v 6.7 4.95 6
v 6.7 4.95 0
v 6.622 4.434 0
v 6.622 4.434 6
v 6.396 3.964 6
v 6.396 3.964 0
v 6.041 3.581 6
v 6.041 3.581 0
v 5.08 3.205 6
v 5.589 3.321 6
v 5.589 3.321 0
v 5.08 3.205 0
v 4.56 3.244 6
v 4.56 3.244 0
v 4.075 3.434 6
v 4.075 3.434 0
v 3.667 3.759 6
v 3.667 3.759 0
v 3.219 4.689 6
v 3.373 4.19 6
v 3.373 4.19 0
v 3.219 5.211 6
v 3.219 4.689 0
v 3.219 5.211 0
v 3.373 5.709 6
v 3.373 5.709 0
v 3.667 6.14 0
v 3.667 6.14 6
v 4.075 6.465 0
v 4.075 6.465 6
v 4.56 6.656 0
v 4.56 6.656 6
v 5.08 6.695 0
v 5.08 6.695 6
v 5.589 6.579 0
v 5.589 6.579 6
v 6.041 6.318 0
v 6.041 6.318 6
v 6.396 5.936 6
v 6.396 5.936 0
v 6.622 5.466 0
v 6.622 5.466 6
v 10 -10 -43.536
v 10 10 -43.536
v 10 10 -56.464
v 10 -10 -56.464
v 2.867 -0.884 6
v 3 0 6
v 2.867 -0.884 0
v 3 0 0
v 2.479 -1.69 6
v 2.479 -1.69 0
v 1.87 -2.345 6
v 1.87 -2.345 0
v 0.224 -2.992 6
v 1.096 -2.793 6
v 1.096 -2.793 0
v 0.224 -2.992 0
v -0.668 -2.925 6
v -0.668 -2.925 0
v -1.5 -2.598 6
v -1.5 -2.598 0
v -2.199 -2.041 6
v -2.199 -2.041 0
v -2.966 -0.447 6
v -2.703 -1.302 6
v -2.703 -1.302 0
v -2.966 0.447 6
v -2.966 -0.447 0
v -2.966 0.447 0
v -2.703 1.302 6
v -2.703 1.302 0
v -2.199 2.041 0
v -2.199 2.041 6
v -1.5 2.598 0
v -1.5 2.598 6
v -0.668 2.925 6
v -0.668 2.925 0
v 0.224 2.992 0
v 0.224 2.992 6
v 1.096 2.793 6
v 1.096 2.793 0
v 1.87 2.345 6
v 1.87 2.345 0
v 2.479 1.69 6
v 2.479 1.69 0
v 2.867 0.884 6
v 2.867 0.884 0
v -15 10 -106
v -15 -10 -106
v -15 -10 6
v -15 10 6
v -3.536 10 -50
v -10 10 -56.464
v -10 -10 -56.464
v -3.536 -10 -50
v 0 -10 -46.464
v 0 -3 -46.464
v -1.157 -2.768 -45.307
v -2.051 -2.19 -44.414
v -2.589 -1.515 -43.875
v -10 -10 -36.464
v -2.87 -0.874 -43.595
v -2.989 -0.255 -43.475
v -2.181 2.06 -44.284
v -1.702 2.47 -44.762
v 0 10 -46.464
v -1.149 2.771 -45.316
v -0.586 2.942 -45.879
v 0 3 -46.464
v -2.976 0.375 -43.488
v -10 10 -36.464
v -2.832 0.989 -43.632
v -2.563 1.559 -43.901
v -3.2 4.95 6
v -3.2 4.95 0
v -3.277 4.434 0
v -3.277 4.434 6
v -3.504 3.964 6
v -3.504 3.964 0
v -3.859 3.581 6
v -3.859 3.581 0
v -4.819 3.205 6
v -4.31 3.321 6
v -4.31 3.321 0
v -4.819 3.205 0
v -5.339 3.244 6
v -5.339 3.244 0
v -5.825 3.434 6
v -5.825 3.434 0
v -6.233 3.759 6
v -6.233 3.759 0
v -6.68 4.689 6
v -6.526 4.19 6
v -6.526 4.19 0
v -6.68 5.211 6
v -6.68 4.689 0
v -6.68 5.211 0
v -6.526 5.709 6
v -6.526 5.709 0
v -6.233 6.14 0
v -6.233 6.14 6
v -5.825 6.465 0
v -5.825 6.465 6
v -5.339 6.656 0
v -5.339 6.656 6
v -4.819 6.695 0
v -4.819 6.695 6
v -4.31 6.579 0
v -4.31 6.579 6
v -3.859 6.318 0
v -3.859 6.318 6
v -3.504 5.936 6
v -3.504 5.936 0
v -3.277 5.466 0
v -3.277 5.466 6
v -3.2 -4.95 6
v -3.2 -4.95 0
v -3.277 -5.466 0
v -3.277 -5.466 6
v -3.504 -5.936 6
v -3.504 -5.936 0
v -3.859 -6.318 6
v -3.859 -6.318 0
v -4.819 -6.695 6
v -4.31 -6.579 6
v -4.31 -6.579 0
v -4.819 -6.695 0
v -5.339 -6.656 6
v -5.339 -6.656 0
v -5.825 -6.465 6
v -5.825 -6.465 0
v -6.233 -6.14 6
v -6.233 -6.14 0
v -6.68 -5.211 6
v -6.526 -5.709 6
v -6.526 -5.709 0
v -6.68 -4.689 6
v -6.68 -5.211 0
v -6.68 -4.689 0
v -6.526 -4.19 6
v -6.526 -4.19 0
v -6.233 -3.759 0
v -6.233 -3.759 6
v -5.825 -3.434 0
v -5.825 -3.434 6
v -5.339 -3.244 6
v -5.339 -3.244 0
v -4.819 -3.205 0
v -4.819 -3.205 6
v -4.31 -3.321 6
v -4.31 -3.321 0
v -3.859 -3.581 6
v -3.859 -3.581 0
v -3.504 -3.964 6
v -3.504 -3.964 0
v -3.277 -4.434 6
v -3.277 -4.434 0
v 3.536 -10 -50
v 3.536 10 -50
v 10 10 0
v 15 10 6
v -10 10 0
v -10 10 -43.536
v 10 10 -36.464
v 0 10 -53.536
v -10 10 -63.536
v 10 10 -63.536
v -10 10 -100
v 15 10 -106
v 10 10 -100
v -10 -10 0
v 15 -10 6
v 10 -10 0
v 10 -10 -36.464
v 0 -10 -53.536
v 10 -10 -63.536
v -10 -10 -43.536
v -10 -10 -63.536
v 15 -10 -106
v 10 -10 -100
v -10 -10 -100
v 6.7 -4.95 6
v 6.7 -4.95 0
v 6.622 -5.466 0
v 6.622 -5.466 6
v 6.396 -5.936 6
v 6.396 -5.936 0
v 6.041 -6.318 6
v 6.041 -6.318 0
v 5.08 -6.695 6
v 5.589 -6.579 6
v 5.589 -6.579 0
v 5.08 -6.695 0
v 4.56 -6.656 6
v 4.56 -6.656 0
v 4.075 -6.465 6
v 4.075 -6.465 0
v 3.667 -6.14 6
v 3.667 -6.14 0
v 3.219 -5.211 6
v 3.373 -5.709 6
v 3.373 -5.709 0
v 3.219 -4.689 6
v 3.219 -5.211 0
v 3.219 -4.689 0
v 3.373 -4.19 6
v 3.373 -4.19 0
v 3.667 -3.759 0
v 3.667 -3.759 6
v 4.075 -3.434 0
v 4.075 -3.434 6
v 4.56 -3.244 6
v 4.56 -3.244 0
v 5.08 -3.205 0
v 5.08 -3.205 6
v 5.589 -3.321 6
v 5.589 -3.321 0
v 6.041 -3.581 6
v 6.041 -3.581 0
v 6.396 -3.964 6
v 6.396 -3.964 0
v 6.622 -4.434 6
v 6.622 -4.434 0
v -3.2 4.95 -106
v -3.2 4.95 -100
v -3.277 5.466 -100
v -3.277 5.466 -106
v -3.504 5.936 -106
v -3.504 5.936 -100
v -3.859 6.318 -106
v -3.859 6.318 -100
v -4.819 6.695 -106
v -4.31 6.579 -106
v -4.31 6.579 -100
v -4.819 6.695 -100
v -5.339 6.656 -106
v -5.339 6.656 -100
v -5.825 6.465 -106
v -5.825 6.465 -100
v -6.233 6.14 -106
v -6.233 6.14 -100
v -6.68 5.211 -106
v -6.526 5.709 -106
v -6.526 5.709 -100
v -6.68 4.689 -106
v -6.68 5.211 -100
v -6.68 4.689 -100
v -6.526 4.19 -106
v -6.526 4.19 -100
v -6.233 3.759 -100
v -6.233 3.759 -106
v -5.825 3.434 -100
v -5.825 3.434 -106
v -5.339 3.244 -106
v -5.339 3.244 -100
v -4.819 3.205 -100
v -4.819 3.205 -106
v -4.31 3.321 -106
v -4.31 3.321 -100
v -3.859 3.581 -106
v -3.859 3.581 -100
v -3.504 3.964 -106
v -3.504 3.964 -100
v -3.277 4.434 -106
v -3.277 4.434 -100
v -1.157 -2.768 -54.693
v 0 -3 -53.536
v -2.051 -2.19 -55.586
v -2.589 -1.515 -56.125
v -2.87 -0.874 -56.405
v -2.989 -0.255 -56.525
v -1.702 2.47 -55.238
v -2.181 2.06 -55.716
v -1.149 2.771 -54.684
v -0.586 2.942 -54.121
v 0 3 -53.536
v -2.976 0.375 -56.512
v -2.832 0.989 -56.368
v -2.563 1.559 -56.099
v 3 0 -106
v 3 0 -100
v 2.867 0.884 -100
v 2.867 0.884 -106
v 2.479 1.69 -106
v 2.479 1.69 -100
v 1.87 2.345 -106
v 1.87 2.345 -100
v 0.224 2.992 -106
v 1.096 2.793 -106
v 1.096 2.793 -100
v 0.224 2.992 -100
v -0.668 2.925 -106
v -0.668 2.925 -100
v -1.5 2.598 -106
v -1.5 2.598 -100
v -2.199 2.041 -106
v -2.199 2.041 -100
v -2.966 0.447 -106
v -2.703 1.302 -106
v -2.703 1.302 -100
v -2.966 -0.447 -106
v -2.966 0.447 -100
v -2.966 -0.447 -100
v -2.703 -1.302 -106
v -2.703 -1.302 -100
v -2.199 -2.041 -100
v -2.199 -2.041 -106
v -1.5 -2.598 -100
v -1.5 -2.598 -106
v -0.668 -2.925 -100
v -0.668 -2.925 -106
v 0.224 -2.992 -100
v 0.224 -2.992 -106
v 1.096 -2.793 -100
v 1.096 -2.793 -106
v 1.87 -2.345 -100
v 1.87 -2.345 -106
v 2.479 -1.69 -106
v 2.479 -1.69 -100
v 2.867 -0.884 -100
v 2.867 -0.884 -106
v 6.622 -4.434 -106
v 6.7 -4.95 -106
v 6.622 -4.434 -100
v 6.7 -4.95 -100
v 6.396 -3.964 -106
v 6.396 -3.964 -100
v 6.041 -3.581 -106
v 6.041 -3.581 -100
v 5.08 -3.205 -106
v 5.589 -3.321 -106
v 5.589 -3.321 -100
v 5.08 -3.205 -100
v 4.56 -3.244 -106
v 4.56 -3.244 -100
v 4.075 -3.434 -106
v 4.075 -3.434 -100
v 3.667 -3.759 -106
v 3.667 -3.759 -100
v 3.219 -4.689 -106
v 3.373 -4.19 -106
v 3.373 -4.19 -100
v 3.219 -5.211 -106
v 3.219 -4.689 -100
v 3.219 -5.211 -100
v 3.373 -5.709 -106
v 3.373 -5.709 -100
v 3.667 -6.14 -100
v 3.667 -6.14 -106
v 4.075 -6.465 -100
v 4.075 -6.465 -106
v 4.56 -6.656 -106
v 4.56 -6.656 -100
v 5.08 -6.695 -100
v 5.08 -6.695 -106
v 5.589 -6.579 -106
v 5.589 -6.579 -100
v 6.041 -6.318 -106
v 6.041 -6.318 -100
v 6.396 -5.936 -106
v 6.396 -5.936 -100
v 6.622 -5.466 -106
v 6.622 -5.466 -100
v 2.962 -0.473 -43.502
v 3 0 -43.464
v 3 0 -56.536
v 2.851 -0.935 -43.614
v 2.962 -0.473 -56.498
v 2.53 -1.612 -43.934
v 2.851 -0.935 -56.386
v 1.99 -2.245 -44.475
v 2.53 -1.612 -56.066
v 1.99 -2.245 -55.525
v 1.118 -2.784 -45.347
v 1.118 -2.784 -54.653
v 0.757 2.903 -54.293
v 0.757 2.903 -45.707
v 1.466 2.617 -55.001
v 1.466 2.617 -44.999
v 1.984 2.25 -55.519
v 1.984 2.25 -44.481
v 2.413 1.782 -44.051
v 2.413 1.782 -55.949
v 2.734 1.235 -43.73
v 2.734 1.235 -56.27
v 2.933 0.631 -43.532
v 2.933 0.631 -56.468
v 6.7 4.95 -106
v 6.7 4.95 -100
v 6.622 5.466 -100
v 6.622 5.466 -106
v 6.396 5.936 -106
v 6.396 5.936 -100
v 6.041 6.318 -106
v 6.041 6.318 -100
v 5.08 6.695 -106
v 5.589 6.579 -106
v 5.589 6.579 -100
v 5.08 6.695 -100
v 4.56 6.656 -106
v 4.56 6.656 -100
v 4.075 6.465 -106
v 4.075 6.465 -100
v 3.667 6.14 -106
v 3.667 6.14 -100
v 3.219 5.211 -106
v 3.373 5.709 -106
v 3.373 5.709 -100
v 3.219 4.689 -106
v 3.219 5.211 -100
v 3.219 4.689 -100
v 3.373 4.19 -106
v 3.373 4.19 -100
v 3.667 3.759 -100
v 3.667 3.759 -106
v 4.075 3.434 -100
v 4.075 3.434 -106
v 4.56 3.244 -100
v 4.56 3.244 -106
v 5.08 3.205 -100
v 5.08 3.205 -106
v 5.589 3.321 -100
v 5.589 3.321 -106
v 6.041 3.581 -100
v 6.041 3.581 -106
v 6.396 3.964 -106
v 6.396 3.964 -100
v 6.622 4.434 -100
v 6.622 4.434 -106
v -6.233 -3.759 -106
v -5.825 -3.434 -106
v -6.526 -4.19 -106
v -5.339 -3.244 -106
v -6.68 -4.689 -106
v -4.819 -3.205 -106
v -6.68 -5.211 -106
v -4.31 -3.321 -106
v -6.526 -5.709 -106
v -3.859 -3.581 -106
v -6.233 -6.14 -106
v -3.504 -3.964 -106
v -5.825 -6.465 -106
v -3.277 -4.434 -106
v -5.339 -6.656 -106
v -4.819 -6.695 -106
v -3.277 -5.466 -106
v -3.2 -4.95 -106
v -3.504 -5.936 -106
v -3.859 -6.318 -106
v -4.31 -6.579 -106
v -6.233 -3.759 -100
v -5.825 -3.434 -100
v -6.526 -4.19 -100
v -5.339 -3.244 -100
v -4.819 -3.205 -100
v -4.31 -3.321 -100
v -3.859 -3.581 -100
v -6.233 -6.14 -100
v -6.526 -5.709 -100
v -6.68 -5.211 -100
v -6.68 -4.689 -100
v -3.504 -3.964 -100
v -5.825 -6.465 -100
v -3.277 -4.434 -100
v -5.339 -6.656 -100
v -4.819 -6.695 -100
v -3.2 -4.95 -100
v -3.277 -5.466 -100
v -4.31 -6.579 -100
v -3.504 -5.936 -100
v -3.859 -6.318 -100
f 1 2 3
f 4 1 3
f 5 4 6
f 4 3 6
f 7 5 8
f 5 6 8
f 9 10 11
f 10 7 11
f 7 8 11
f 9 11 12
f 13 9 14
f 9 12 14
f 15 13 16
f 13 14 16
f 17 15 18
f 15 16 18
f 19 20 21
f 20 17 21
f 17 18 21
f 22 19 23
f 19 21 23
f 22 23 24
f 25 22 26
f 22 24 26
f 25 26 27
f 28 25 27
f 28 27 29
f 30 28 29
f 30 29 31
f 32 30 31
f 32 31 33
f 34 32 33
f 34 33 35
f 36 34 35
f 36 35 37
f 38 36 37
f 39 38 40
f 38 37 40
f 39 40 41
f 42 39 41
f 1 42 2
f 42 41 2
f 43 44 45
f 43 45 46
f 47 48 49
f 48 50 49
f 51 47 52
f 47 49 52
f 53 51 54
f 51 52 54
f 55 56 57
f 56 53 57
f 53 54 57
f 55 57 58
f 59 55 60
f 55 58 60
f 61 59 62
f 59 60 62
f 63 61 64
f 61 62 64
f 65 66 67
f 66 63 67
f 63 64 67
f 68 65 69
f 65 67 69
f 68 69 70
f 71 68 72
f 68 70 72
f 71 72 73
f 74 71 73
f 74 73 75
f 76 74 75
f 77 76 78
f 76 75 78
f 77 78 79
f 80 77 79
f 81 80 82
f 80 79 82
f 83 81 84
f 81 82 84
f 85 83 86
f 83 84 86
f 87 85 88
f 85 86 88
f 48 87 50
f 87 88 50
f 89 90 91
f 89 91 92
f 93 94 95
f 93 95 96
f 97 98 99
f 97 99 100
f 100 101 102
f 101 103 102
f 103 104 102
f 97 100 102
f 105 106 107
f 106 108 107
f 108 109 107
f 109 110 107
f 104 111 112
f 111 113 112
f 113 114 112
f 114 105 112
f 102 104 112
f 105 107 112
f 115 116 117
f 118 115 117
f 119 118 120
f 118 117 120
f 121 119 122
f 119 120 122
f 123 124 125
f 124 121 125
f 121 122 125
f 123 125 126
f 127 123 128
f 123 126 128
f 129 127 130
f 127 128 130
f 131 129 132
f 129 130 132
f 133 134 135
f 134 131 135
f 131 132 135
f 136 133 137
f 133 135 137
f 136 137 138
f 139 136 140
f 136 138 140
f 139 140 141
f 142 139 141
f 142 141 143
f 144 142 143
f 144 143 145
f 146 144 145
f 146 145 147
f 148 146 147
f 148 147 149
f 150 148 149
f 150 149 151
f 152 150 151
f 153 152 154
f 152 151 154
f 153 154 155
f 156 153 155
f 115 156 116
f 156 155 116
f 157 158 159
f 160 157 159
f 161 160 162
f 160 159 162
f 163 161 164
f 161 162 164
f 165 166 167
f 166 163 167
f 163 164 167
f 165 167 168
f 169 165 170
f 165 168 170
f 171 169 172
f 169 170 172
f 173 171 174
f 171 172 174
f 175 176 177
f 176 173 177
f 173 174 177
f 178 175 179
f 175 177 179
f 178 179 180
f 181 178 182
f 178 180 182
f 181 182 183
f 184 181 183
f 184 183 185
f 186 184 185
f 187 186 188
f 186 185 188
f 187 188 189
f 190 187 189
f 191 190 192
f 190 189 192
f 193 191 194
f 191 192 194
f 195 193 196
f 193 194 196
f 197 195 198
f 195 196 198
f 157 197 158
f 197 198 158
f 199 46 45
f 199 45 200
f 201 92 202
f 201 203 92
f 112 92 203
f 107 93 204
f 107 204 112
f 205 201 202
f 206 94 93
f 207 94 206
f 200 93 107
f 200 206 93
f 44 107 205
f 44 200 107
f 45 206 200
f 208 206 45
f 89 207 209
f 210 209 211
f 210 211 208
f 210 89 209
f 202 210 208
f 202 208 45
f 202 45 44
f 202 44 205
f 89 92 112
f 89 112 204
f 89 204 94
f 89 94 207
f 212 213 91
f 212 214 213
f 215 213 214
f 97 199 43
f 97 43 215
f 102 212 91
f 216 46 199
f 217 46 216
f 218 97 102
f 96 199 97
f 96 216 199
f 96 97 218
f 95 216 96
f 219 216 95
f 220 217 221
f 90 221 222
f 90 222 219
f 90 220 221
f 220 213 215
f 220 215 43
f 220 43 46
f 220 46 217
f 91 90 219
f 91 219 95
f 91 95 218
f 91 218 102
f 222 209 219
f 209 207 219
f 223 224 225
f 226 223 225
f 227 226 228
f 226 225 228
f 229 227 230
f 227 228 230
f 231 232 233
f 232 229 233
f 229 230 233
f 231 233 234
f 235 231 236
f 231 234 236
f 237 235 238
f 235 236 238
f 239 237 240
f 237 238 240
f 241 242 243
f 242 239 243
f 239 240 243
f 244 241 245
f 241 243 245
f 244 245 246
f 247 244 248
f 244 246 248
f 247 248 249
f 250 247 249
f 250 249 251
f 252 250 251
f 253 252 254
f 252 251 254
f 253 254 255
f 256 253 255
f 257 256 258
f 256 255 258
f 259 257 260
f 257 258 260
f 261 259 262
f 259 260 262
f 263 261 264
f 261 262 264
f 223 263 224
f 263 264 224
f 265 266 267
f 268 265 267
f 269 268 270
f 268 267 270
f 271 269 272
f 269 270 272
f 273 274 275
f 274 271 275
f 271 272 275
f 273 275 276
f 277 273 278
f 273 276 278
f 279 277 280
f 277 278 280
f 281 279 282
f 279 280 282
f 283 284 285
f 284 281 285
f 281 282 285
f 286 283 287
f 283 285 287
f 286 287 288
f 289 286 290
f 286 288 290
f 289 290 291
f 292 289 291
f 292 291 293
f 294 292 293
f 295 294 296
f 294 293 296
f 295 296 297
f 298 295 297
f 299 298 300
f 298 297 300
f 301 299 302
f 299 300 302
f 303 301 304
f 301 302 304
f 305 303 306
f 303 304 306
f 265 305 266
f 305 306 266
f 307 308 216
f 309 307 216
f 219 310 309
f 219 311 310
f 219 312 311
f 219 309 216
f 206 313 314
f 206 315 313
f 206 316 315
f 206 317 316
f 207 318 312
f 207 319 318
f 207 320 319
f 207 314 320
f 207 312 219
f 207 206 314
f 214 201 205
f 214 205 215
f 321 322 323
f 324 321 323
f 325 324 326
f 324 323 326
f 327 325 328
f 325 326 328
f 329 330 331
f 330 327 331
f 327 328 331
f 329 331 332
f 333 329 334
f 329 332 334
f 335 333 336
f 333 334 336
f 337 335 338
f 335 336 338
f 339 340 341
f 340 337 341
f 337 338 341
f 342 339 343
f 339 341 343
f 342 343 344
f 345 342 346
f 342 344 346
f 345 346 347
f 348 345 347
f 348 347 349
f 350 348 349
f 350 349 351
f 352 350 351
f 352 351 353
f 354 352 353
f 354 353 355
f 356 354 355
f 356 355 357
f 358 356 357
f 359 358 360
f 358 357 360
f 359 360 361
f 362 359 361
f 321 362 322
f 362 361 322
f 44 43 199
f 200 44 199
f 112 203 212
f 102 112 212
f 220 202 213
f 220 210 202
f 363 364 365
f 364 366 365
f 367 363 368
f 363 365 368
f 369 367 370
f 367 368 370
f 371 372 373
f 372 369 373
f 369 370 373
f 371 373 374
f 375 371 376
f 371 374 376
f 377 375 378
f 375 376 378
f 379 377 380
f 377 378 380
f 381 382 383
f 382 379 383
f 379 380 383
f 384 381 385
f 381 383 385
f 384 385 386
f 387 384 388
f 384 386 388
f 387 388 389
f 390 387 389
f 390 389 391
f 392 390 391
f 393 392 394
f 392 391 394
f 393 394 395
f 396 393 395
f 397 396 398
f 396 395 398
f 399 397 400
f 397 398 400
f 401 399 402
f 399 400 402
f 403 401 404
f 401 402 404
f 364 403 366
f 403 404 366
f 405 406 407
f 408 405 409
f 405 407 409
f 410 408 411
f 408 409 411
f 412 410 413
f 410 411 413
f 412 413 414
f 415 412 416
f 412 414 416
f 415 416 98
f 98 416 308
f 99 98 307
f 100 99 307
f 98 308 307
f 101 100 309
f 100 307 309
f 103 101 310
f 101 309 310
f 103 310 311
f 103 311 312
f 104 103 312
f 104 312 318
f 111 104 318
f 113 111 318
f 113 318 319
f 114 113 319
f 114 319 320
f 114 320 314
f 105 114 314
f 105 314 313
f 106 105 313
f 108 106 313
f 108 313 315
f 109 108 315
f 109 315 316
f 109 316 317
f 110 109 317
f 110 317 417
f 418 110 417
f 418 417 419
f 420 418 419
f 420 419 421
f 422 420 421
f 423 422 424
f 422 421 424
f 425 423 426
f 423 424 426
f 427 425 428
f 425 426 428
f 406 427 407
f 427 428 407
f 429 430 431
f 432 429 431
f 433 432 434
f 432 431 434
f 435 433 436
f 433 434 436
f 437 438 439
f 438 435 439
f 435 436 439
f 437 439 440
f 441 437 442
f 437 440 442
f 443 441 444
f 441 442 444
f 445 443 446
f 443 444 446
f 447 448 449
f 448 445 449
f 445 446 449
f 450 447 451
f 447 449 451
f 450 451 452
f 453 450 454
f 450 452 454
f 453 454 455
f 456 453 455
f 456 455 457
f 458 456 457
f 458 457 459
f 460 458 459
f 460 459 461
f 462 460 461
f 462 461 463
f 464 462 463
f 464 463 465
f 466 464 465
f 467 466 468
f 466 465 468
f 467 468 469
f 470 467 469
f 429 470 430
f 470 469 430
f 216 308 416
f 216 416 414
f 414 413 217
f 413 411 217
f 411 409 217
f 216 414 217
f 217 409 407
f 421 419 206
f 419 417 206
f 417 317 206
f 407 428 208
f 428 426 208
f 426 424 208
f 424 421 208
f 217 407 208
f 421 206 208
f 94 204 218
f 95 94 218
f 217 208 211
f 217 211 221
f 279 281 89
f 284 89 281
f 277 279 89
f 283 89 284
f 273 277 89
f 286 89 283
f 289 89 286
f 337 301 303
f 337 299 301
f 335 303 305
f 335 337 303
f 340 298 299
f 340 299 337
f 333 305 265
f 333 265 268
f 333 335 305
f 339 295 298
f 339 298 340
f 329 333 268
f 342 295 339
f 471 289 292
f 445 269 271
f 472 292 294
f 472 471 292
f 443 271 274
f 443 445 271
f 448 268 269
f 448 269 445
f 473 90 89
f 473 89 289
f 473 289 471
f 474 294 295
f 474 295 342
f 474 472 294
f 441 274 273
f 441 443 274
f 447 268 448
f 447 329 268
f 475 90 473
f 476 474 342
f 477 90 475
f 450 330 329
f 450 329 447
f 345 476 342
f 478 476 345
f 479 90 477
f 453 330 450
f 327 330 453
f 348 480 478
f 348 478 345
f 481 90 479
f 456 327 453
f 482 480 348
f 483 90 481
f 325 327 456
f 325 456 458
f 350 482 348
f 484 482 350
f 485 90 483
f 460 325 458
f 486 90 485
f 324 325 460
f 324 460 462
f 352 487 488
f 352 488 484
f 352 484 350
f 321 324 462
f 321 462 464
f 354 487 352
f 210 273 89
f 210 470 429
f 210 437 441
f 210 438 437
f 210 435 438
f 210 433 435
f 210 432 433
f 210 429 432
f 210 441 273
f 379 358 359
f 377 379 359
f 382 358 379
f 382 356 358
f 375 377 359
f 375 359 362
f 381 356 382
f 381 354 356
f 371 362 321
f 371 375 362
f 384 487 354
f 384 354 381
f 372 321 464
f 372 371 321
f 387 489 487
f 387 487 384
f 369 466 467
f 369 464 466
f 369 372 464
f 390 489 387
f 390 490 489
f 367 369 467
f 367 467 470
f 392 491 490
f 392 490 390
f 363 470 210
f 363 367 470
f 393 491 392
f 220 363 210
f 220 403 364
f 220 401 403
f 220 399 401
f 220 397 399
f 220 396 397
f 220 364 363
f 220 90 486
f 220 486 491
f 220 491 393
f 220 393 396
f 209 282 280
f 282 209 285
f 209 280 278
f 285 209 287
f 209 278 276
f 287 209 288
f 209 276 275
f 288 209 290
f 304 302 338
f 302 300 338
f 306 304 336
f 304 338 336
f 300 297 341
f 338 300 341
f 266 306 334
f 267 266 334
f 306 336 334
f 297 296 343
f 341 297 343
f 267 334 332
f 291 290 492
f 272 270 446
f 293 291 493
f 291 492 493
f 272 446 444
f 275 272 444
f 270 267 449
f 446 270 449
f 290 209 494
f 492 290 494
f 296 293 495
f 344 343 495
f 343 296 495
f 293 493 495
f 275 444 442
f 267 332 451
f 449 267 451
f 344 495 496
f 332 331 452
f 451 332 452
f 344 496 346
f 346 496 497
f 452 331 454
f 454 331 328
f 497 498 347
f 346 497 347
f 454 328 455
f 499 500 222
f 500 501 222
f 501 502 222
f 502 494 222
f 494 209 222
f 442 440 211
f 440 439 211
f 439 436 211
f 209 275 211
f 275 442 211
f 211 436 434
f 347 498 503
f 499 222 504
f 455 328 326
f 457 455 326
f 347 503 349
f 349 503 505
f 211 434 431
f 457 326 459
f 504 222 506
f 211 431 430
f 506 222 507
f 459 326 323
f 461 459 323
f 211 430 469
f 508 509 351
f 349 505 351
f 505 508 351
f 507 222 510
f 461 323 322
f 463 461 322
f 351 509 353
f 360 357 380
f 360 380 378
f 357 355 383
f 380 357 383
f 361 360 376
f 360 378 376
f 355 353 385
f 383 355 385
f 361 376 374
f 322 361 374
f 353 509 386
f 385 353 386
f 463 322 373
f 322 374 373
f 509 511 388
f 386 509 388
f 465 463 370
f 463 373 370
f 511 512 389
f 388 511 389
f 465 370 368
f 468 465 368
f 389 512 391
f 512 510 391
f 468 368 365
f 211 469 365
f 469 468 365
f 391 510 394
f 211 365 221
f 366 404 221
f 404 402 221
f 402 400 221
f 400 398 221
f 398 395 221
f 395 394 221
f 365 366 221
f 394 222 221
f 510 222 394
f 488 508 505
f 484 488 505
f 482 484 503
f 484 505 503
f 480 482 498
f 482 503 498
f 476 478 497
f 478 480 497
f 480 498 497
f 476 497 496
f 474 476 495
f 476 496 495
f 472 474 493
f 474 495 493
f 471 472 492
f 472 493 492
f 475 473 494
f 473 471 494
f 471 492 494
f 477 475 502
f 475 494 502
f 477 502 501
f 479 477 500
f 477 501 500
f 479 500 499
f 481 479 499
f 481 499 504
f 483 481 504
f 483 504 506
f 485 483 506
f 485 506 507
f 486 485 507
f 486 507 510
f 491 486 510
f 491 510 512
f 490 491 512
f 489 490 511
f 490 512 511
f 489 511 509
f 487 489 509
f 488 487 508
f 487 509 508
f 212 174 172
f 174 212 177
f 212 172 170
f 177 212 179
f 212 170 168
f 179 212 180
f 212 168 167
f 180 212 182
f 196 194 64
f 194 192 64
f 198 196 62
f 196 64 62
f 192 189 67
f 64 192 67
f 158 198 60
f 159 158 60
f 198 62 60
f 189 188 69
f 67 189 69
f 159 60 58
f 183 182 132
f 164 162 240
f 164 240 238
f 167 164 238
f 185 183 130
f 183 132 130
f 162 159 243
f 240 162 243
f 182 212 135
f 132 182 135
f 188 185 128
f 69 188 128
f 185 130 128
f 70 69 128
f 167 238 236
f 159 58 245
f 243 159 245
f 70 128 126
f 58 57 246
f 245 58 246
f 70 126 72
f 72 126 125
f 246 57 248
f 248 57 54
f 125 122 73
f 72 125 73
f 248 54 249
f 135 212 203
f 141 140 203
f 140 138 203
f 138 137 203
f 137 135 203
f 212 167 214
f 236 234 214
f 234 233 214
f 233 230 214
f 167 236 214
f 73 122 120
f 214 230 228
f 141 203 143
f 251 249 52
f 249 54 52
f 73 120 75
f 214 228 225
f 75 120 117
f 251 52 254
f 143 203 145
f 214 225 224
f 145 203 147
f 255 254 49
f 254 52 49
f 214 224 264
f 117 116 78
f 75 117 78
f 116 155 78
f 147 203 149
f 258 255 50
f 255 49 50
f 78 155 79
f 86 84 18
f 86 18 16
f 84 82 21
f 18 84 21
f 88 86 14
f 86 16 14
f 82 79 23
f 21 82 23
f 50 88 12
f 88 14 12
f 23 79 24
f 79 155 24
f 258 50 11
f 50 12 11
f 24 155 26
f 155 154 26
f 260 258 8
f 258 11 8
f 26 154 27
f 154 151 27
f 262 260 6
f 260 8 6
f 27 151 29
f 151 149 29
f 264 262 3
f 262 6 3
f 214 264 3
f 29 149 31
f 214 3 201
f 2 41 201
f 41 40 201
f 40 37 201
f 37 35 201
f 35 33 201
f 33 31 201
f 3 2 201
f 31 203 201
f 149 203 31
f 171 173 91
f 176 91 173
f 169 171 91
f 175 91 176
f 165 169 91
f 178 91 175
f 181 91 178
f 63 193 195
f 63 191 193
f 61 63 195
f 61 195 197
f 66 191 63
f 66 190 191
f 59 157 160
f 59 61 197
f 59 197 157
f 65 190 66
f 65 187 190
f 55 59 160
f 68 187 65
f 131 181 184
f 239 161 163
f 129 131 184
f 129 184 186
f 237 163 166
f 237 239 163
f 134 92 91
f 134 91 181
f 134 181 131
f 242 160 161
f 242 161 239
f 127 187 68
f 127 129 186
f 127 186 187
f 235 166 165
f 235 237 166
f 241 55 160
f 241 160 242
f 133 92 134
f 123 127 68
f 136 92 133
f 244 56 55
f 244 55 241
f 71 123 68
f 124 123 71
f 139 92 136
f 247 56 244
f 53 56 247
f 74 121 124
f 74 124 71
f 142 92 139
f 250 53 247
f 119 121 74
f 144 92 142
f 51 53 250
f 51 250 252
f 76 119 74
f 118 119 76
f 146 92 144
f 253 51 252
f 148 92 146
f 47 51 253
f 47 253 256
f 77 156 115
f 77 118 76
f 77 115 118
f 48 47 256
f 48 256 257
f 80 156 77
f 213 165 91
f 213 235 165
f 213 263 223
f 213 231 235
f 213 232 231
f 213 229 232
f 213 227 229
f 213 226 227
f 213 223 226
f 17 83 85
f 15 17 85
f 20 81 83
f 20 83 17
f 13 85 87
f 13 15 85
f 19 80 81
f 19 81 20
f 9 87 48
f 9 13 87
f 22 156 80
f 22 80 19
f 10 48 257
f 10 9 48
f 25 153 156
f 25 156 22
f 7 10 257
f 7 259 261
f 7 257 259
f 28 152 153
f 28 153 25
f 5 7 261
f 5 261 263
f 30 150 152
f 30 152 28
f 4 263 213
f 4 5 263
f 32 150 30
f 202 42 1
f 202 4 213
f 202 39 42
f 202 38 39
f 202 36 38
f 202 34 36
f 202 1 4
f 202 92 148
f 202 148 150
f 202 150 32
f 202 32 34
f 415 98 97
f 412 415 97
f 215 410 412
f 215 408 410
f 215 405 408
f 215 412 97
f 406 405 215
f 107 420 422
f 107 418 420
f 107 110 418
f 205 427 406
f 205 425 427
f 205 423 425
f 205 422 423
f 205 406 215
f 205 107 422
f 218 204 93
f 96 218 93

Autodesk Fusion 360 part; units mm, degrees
sketch "草图1" plane through (0, 0, 0) normal (0, 0, 1) x (1, 0, 0)
  line L0 (15, -10) -> (-15, -10)
  line L1 (-15, -10) -> (-15, 10)
  line L2 (-15, 10) -> (15, 10)
  line L3 (15, 10) -> (15, -10)
  line L4 (15, -10) -> (-15, 10) construction
  line L5 (-15, -10) -> (15, 10) construction
  line L6 (0, 0) -> (19, 0) construction
  line L7 (0, 0) -> (9.0277, 9.0277) construction
  circle A0 centre (0, 0) radius 7 construction
  circle A1 centre (4.9497, 4.9497) radius 1.75
  circle A2 centre (-4.9497, 4.9497) radius 1.75
  circle A3 centre (-4.9497, -4.9497) radius 1.75
  circle A4 centre (4.9497, -4.9497) radius 1.75
  circle A5 centre (0, 0) radius 3
  dimension "d1" = 20
  dimension "d2" = 30
  dimension "d3" = 45
  dimension "d4" = 14
  dimension "d5" = 3.5
  dimension "d7" = 360
  dimension "d8" = 6
extrude "拉伸1" add sketch "草图1" along normal blind 6 makes body 1
sketch "草图2" plane through (0, 0, 0) normal (0, 0, -1) x (1, 0, 0)
  circle A0 centre (0, 0) radius 3
  circle A1 centre (4.9497, -4.9497) radius 1.75
  circle A2 centre (-4.9497, 4.9497) radius 1.75
  circle A3 centre (4.9497, 4.9497) radius 1.75
  circle A4 centre (-4.9497, -4.9497) radius 1.75
  line L0 (-15, -10) -> (15, -10)
  line L1 (15, -10) -> (15, 10)
  line L2 (15, 10) -> (-15, 10)
  line L3 (-15, 10) -> (-15, -10)
  line L4 (15, -10) -> (10, -10)
  line L5 (10, -10) -> (10, 10)
  line L6 (10, 10) -> (15, 10)
  line L7 (15, 10) -> (15, -10)
  line L8 (-15, -10) -> (-10, -10)
  line L9 (-10, -10) -> (-10, 10)
  line L10 (-10, 10) -> (-15, 10)
  line L11 (-15, 10) -> (-15, -10)
  dimension "d11" = 5
  dimension "d12" = 5
extrude "拉伸2" add sketch "草图2" along normal blind 100 contours L0 L2 L3 L8 L9 L10 L11 | L0 L1 L2 L4 L5 L6 L7 bodies 1
sketch "草图3" plane through (0, 0, -100) normal (0, 0, -1) x (1, 0, 0)
  line L0 (-15, 10) -> (-15, -10)
  line L1 (-15, -10) -> (-10, -10)
  line L2 (-10, -10) -> (-10, 10)
  line L3 (-10, 10) -> (-15, 10)
  line L4 (-10, 10) -> (-10, -10)
  line L5 (-10, -10) -> (10, -10)
  line L6 (10, -10) -> (10, 10)
  line L7 (10, 10) -> (-10, 10)
  circle A0 centre (-4.9497, -4.9497) radius 1.75
  circle A1 centre (4.9497, 4.9497) radius 1.75
  circle A2 centre (-4.9497, 4.9497) radius 1.75
  circle A3 centre (4.9497, -4.9497) radius 1.75
  circle A4 centre (0, 0) radius 3
  line L8 (15, 10) -> (10, 10)
  line L9 (10, 10) -> (10, -10)
  line L10 (10, -10) -> (15, -10)
  line L11 (15, -10) -> (15, 10)
extrude "拉伸3" add sketch "草图3" along normal blind 6 bodies 1
sketch "草图4" plane through (0, 10, 0) normal (0, 1, 0) x (-1, 0, 0)
  line L0 (15, -106) -> (15, 6)
  line L1 (15, 6) -> (-15, 6)
  line L2 (-15, 6) -> (-15, -106)
  line L3 (-15, -106) -> (15, -106)
  line L4 (10, -100) -> (-10, -100)
  line L5 (-10, -100) -> (-10, 0)
  line L6 (-10, 0) -> (10, 0)
  line L7 (10, 0) -> (10, -100)
  line L8 (47.9011, -50) -> (-70, -50)
  line L9 (0, -112.7701) -> (0, 40) construction
  line L10 (-10, -63.5355) -> (-13.5355, -60)
  line L11 (-13.5355, -60) -> (10, -36.4645)
  line L12 (10, -36.4645) -> (13.5355, -40)
  line L13 (13.5355, -40) -> (-10, -63.5355)
  line L14 (-10, -63.5355) -> (10, -36.4645)
  line L15 (13.5355, -40) -> (-13.5355, -60)
  line L16 (-10, -36.4645) -> (-13.5355, -40)
  line L17 (13.5355, -60) -> (-10, -36.4645)
  line L18 (-13.5355, -40) -> (10, -63.5355)
  line L19 (10, -63.5355) -> (13.5355, -60)
  line L20 (-10, -36.4645) -> (10, -63.5355)
  line L21 (13.5355, -60) -> (-13.5355, -40)
  point P0 (0, -50)
  dimension "d17" = 45
  dimension "d18" = 5
extrude "拉伸4" add sketch "草图4" against normal blind 20 contours L7 L13 L15 L17 | L7 L13 L17 L21 | L8 L13 L21 | L8 L15 L17 | L7 L14 L15 L17 | L7 L13 L20 L21 | L8 L15 L18 | L13 L14 L18 L20 | L11 L14 L17 L20 | L14 L15 L17 | L14 L15 L18 | L11 L20 L21 | L13 L20 L21 | L8 L11 L21 | L5 L11 L15 L18 | L5 L11 L18 L21 | L11 L14 L17 | L13 L18 L20 | L13 L14 L18 | L5 L14 L15 L18 | L11 L17 L20 | L5 L11 L20 L21 bodies 1
sketch "草图5" plane through (0, 0, -106) normal (0, 0, -1) x (1, 0, 0)
  circle A0 centre (4.9497, -4.9497) radius 1.75
  circle A1 centre (4.9497, 4.9497) radius 1.75
  circle A2 centre (-4.9497, 4.9497) radius 1.75
  circle A3 centre (0, 0) radius 3
  circle A4 centre (-4.9497, -4.9497) radius 1.75
  line L0 (15, -10) -> (15, 10)
  line L1 (15, 10) -> (-10, 10)
  line L2 (-10, 10) -> (-15, 10)
  line L3 (-15, 10) -> (-15, -10)
  line L4 (-15, -10) -> (15, -10)
  circle A5 centre (0, 0) radius 3
extrude "拉伸5" cut sketch "草图5" against normal blind 112 contours A3 A5 bodies 1
copy_body "实体->零部件1" bodies 1 removing the originals makes body 2 in component "大臂"
component "大臂" placed x (1, 0, 0) y (0, 1, 0) z (0, 0, 1) at (0, 0, 0)
